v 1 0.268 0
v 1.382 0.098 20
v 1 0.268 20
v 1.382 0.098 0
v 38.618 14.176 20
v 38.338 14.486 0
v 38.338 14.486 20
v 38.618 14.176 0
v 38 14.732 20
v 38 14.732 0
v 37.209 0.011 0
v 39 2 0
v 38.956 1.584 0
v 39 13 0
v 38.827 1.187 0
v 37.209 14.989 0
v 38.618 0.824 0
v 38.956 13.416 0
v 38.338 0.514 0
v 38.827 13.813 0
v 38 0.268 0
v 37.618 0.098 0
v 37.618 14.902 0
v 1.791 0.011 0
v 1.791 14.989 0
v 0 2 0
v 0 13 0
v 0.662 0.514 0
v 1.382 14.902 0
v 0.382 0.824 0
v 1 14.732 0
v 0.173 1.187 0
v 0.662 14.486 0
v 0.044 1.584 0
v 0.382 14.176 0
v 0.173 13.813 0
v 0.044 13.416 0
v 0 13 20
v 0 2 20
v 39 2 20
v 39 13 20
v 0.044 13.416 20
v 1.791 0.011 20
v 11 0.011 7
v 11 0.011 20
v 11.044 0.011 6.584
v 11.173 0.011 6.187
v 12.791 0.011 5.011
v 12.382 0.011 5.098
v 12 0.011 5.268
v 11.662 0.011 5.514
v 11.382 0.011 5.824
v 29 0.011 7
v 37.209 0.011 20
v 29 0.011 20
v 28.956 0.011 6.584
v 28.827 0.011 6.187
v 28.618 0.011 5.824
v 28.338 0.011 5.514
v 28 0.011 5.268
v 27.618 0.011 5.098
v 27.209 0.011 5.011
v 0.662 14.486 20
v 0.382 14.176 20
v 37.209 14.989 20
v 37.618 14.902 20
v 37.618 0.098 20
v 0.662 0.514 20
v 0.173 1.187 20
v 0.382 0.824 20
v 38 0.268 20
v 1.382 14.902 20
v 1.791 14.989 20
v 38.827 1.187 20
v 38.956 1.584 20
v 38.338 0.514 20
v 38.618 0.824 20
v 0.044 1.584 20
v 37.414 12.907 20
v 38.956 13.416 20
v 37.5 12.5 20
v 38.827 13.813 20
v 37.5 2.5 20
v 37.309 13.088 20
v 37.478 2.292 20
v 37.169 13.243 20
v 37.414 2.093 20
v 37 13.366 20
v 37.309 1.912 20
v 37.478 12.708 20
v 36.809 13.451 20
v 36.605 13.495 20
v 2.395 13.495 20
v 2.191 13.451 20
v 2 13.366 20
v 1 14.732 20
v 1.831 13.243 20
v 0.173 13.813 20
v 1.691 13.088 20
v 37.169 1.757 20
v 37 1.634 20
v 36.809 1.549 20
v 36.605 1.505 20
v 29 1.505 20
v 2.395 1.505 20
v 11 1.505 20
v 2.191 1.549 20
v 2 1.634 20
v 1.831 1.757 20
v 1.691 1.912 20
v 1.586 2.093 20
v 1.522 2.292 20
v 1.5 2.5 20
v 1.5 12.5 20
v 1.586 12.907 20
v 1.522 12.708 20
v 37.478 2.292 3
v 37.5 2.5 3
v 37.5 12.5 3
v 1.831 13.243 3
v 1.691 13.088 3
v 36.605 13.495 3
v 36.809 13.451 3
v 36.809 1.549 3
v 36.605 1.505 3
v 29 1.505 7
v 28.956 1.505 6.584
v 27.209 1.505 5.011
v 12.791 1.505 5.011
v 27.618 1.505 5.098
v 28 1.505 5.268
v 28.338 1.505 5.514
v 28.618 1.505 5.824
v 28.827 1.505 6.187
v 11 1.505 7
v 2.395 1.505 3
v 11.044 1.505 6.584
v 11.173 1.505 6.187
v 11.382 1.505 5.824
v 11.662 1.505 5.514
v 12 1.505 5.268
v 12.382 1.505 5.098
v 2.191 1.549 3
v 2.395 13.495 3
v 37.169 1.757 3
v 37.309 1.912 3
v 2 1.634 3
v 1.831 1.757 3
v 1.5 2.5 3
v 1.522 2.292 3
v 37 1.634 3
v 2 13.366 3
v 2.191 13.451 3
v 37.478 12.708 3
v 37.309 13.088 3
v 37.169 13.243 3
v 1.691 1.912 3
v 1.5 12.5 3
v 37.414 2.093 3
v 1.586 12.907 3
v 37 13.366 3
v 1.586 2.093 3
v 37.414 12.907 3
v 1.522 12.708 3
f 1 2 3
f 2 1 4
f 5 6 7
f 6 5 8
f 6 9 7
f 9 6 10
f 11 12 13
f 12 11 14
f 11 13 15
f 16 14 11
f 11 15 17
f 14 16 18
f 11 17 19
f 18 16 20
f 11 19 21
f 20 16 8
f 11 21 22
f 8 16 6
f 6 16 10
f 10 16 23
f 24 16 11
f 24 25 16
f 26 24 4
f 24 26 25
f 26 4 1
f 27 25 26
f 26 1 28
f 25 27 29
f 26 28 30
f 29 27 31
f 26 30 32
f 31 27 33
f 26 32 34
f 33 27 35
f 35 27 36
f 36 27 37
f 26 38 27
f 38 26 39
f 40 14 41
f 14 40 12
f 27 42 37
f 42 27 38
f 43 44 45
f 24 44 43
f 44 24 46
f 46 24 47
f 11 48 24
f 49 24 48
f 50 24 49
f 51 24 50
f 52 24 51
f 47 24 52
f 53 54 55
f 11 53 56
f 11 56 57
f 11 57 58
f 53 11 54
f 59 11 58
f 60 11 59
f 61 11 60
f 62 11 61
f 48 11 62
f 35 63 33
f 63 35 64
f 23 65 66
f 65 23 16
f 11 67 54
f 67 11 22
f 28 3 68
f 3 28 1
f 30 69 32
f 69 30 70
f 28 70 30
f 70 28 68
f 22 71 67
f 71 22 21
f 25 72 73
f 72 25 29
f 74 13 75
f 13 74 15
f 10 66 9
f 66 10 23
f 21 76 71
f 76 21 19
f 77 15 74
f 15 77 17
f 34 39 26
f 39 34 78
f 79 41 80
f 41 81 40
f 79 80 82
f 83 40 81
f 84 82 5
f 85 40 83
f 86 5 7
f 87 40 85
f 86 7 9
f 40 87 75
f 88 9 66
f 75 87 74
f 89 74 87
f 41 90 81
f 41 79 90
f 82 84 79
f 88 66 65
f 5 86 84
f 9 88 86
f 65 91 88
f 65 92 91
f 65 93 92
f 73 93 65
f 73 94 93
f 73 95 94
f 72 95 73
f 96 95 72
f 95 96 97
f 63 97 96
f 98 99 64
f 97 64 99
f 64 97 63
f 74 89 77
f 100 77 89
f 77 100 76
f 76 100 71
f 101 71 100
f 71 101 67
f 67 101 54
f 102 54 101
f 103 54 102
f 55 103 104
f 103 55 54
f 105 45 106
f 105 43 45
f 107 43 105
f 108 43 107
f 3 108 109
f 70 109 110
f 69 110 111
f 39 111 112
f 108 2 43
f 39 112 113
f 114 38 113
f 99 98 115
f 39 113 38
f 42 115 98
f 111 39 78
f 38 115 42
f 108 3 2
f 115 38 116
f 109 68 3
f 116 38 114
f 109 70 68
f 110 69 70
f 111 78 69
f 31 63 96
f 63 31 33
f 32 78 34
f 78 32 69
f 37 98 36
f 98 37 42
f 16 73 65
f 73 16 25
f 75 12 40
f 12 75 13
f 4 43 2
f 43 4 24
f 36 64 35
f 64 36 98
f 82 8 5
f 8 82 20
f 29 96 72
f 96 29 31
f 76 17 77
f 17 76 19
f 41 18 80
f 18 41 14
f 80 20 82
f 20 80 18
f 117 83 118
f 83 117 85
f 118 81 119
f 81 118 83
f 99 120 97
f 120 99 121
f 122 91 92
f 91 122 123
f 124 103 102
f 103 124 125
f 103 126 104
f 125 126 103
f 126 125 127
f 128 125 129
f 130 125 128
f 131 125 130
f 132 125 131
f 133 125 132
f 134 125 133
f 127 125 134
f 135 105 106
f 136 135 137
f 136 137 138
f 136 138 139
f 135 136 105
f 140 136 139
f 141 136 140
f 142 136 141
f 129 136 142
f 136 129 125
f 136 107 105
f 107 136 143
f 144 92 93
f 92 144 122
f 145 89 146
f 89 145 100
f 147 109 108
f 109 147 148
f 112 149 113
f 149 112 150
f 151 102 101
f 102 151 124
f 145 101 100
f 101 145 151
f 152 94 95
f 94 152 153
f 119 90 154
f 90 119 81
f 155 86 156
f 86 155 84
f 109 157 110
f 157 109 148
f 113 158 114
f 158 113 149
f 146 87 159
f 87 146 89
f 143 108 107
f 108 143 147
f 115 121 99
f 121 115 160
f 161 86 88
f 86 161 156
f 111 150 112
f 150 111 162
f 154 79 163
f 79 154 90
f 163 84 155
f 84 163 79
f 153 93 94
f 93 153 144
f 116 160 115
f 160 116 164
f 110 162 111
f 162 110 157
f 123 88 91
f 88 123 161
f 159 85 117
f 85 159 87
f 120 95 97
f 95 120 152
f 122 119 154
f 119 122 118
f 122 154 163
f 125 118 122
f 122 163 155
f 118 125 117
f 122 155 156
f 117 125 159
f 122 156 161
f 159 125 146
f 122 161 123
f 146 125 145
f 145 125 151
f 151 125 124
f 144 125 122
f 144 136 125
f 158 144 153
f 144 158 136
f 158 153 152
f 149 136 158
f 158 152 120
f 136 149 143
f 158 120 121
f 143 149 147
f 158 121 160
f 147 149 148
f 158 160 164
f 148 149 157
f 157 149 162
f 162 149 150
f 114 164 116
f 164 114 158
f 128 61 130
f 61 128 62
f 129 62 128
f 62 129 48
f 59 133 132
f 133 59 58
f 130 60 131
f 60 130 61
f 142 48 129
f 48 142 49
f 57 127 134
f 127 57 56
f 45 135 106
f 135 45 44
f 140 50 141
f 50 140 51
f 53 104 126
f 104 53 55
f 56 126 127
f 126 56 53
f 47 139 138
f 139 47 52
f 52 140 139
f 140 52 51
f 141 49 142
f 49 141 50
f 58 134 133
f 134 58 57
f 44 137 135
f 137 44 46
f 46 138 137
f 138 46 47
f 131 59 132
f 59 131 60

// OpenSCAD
difference() {
    round_cube(39, 15, 20, 2);
    
    translate ([1.5, 1.5, 3]) 
    round_cube(36, 12, 20, 1);
    
    translate ([11, 5, 5]) 
    rotate([90,0,0])
    
    round_cube(18, 25, 10, 2);
}        

module round_cube(l=40,w=30,h=20,r=5,$fn=30){
	hull(){ 
		translate ([r, r, 0]) cylinder (h = h, r=r);
		translate ([r, w-r, 0]) cylinder (h = h, r=r);
		translate ([l-r,w-r, 0]) cylinder (h = h, r=r);
		translate ([l-r, r, 0]) cylinder (h = h, r=r);
	}
}
